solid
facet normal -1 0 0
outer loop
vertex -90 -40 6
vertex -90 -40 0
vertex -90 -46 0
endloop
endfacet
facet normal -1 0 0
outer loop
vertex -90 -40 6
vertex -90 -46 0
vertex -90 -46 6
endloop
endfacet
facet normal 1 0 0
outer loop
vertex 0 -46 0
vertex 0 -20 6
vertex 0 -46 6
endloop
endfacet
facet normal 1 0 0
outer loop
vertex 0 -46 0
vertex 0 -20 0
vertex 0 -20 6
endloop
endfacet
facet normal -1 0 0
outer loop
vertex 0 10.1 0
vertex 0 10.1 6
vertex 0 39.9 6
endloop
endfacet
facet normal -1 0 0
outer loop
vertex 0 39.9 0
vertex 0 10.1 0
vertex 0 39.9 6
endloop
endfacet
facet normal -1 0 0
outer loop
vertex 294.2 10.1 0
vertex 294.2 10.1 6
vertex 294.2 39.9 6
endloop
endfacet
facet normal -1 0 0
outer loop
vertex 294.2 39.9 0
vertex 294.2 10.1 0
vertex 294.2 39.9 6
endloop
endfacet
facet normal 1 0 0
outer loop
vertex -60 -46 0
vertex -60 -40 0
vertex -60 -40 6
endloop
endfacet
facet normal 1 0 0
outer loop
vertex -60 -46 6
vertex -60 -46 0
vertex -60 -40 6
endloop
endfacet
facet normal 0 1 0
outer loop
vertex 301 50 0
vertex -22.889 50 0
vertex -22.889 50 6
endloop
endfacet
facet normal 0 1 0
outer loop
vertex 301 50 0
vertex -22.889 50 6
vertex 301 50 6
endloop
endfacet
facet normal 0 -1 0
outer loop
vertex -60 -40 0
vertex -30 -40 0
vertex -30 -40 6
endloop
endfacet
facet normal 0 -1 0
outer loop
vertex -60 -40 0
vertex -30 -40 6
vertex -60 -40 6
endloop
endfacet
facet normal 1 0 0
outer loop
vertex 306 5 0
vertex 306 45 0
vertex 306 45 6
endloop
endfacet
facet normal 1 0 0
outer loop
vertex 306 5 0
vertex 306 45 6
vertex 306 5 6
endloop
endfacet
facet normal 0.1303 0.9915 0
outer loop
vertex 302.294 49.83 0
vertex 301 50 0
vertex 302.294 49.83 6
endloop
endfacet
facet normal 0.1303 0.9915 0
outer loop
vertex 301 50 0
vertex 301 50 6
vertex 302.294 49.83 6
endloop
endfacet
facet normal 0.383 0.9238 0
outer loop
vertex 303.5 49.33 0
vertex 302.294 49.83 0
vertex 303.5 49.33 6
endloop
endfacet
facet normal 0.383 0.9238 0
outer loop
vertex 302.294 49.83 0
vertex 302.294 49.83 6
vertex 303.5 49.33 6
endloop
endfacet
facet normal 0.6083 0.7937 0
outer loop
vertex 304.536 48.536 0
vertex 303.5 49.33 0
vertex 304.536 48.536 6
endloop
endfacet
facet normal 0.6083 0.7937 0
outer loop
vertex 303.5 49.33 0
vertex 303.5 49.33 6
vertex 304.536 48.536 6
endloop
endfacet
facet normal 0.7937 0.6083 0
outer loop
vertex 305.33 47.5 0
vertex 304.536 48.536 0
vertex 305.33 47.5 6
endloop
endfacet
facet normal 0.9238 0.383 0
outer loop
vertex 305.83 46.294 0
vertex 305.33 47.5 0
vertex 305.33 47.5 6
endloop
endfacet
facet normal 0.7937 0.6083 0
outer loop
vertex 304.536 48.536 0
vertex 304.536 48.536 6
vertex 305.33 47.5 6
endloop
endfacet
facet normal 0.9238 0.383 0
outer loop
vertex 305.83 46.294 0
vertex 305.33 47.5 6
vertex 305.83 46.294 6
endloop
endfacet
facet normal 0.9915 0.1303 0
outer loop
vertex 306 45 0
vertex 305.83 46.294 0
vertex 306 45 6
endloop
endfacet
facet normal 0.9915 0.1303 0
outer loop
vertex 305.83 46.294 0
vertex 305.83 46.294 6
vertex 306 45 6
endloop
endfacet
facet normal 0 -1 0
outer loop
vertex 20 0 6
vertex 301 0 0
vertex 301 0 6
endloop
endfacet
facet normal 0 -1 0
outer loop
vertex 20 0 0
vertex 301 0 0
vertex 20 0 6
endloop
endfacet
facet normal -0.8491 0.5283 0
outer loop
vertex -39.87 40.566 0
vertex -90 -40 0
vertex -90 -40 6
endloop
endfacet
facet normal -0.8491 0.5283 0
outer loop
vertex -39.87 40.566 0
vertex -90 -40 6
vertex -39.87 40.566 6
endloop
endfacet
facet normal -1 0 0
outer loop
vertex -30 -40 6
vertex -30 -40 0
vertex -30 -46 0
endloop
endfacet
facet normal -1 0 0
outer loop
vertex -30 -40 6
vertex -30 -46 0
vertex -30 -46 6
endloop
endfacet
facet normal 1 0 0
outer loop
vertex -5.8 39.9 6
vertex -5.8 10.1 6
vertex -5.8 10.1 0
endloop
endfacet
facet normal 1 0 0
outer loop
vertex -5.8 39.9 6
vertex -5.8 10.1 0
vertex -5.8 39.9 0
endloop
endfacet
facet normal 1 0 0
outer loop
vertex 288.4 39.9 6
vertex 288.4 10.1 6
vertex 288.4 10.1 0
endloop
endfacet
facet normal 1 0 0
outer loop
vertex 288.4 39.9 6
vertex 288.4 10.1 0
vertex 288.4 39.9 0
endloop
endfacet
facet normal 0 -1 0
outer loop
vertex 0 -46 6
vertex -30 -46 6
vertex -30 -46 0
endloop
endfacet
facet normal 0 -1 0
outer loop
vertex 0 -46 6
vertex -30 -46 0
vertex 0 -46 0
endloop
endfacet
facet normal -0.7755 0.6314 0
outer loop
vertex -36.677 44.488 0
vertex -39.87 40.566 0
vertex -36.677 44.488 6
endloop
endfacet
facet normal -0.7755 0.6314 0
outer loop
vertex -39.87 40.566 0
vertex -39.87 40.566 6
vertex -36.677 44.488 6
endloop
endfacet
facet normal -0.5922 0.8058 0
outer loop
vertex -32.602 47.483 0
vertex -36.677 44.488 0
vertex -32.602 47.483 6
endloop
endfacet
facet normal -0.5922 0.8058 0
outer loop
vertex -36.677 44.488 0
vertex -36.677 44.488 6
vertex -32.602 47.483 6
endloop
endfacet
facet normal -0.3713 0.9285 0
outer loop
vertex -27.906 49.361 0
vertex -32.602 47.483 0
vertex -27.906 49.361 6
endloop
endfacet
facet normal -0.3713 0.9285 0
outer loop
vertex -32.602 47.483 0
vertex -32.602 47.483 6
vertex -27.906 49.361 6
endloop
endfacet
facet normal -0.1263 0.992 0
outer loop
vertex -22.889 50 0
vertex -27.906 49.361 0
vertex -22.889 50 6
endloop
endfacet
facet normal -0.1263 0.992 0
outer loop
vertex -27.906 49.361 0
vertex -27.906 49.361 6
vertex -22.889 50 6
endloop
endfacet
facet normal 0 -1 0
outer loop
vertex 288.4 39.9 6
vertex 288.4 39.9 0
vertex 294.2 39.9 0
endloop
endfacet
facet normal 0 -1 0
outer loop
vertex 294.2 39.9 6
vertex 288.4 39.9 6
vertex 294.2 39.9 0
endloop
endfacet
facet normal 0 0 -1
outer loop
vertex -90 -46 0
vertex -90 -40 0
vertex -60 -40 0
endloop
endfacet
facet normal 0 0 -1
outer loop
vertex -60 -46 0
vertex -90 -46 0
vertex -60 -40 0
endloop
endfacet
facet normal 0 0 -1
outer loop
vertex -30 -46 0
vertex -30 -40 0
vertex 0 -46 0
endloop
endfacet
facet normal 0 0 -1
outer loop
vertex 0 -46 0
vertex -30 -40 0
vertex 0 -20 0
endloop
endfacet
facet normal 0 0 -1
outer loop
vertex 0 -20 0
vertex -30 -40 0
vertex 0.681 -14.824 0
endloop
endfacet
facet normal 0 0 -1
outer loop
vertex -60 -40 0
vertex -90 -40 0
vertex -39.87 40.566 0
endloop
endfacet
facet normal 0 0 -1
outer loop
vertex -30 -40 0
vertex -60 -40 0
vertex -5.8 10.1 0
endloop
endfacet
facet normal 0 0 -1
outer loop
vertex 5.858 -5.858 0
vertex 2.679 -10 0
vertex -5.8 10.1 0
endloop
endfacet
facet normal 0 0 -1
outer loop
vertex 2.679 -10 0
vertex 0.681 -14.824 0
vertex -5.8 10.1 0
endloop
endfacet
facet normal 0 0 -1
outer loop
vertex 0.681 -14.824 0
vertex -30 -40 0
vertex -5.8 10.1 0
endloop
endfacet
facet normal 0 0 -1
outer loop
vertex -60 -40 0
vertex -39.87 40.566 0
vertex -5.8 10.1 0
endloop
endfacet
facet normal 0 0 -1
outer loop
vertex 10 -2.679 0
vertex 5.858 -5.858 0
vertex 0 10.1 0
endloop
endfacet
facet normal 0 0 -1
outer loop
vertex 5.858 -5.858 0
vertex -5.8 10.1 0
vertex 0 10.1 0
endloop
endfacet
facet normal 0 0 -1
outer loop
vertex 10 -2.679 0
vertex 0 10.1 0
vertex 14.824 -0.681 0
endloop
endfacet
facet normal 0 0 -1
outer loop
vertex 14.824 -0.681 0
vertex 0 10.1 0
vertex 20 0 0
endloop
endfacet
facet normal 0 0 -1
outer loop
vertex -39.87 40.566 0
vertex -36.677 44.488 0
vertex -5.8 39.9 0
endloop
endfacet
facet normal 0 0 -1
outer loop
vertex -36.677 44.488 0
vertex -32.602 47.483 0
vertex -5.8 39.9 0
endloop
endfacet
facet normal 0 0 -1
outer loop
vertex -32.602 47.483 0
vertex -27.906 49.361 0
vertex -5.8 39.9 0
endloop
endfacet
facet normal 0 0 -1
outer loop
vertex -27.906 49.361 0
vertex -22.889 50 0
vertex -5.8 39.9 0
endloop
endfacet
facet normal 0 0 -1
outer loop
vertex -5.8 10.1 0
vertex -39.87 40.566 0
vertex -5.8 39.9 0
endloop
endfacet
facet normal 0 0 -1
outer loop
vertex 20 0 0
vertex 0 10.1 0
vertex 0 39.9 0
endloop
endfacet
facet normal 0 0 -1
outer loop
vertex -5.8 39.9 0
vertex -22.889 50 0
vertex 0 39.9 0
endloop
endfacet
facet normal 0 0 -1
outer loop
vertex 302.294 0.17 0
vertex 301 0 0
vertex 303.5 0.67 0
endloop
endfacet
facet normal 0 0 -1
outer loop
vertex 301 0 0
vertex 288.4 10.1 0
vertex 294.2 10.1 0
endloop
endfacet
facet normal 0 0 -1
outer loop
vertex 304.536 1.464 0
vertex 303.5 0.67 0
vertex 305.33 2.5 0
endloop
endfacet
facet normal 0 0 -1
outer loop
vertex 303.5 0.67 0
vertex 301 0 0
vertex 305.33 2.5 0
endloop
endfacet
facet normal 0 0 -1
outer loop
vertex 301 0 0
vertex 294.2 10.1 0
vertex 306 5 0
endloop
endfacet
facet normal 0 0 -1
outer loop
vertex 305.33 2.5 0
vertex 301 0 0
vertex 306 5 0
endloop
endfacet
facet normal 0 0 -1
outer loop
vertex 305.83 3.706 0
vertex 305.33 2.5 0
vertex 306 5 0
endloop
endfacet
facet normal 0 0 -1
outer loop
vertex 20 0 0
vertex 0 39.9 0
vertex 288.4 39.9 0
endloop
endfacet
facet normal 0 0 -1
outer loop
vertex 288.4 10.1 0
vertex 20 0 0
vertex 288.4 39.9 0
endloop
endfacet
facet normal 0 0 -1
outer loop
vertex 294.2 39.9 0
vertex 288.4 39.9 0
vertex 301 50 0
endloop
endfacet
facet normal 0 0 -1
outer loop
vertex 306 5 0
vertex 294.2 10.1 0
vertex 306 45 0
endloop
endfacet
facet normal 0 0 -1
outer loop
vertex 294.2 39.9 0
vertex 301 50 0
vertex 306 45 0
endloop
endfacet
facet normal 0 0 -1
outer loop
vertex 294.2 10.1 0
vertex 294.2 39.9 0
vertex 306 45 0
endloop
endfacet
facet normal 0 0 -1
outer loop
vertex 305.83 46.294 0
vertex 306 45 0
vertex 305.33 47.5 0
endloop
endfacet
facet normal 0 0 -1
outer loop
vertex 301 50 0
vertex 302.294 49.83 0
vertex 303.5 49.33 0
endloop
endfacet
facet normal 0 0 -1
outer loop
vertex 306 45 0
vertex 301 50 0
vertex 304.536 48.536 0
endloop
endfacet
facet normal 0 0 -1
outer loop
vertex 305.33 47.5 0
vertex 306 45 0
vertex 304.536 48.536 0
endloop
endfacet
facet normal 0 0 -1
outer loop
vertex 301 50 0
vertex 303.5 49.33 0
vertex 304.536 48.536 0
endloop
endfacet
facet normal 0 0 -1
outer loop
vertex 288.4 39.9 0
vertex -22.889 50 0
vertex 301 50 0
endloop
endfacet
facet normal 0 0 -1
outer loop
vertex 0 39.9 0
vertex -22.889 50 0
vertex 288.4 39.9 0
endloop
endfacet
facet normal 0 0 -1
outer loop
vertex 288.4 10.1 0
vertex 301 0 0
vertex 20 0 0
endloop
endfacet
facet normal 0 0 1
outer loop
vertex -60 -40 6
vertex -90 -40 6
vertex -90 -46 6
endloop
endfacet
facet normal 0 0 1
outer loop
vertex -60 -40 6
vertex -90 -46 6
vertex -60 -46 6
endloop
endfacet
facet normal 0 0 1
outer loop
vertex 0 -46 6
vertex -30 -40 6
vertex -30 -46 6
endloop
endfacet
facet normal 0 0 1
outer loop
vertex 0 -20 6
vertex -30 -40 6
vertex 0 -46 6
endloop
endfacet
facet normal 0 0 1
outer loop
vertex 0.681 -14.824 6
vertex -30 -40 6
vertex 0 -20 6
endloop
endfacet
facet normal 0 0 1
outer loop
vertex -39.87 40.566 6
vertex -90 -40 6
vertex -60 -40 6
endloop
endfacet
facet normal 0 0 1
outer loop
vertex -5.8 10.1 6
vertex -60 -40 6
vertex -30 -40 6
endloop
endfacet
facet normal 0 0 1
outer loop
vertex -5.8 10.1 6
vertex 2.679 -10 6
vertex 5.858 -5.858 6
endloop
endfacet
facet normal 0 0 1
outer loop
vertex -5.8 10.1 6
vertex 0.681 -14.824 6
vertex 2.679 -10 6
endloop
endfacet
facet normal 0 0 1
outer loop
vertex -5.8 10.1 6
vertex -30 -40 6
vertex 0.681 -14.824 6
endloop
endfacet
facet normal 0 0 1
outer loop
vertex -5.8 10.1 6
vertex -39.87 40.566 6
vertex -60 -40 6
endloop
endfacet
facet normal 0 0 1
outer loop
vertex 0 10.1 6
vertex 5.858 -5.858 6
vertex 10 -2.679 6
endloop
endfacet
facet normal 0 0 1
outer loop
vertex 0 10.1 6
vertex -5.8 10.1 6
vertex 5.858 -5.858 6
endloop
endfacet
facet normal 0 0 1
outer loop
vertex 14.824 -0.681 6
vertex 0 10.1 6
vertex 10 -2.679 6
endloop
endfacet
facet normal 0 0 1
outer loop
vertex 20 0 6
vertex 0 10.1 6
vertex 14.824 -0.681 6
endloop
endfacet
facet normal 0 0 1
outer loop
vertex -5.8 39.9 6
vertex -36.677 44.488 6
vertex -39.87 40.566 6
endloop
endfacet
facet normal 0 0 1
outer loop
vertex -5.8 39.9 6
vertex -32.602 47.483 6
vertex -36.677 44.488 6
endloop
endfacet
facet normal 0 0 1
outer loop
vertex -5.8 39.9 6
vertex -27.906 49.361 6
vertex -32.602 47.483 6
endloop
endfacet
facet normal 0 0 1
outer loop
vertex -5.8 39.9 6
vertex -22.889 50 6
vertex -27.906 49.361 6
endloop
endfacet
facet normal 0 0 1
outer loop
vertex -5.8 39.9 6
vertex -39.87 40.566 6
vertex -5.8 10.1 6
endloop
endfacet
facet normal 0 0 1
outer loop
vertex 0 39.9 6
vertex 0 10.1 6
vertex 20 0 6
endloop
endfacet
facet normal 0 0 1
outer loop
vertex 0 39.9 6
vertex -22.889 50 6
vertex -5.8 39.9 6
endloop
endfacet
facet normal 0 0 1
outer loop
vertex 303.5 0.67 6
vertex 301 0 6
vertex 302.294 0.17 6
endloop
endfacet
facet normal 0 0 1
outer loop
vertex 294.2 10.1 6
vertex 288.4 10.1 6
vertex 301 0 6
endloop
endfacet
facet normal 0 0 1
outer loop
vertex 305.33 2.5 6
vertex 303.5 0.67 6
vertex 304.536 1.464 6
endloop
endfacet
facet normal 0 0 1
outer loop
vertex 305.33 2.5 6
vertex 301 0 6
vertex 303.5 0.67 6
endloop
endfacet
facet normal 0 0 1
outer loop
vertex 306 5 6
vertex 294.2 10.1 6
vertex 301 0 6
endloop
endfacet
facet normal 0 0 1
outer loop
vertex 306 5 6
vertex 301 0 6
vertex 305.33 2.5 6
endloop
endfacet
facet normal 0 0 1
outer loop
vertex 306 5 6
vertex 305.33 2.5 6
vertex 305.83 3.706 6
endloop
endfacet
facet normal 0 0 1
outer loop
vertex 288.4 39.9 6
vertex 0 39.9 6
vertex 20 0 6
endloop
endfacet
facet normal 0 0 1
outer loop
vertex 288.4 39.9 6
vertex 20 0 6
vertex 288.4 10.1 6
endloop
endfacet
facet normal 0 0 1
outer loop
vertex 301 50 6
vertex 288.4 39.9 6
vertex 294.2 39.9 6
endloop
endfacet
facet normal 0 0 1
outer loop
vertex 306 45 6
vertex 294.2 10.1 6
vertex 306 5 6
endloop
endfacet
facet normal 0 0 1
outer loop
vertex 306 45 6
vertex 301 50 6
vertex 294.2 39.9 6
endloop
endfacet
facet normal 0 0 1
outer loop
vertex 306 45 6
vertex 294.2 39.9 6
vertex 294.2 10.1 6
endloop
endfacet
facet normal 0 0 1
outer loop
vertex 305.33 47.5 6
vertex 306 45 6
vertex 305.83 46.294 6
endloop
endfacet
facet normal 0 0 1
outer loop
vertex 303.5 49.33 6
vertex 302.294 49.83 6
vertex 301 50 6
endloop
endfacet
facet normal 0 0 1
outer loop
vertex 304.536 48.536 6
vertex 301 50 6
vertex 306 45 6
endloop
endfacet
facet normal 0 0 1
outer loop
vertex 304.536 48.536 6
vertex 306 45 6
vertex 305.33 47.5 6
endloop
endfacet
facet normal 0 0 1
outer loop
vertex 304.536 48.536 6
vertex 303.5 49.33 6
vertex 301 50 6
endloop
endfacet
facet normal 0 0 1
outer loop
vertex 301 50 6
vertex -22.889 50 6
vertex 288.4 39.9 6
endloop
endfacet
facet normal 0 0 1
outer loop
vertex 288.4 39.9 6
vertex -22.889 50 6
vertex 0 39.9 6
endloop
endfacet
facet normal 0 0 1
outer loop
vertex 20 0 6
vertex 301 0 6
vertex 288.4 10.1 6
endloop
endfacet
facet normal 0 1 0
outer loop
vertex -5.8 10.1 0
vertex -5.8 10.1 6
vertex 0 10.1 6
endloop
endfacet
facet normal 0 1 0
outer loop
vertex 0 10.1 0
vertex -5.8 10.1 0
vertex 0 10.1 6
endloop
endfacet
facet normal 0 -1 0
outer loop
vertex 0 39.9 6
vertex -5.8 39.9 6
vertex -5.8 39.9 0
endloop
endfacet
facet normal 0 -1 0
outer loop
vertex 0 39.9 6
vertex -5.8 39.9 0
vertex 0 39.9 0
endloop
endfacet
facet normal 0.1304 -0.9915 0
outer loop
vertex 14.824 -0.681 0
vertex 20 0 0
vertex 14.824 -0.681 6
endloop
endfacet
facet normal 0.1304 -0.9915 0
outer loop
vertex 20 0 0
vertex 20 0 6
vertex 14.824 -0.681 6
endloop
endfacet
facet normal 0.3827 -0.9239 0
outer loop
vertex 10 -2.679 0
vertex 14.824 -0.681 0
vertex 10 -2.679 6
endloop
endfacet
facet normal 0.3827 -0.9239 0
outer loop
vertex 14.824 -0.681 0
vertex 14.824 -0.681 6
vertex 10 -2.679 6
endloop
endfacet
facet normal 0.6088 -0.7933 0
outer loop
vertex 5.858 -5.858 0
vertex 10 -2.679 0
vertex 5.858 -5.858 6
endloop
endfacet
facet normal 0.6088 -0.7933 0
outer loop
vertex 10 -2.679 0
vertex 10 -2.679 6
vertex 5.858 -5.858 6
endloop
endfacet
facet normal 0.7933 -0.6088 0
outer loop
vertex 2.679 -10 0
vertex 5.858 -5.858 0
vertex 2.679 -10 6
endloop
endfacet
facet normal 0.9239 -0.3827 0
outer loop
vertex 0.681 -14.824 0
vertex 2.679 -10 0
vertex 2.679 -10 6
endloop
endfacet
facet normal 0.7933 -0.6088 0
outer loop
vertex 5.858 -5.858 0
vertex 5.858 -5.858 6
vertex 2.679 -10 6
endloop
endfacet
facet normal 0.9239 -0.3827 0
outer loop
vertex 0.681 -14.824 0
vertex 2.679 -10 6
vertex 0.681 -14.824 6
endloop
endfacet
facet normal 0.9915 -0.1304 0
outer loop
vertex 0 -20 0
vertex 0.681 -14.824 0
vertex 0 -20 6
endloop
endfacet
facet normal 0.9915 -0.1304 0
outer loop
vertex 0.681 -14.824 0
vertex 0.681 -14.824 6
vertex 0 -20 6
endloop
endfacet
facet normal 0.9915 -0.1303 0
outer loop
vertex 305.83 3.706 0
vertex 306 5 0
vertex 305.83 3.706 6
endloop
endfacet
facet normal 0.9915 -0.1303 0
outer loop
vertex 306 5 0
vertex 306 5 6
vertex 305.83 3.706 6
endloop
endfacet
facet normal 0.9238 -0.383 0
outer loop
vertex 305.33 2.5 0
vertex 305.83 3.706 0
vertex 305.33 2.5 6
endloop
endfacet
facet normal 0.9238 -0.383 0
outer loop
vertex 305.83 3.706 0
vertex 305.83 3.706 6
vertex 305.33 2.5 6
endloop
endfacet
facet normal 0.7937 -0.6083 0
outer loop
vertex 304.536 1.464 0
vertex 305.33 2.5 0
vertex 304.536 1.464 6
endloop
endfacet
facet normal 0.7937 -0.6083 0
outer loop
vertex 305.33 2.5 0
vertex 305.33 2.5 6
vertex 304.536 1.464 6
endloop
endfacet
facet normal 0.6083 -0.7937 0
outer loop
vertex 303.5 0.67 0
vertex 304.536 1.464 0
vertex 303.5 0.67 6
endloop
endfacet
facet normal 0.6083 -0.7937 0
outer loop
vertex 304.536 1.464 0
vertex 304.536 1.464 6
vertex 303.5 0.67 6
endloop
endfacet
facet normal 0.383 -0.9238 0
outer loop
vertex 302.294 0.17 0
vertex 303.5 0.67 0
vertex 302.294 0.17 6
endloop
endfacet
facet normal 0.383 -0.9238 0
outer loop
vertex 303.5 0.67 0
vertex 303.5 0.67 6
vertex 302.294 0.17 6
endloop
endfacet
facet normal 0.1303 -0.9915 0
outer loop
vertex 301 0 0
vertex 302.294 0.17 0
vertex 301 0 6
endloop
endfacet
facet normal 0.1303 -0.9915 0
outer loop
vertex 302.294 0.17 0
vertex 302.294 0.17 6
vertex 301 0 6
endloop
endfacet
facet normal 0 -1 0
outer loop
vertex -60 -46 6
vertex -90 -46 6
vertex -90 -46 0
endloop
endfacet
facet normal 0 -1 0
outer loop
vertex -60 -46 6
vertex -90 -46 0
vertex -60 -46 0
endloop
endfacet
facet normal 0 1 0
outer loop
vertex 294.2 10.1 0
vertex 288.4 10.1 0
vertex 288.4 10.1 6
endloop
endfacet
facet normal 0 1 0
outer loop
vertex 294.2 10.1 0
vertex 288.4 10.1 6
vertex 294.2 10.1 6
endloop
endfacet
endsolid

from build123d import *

# Parameters (mm, degrees)
SALIENTE_EXTRUIR1_DEPTH = 6
CROQUIS2_W              = 30
CROQUIS2_H              = 6
SALIENTE_EXTRUIR2_DEPTH = 6
CORTAR_EXTRUIR1_REACH   = 8
CROQUIS3_W              = 5.8
CROQUIS3_H              = 29.8
REDONDEO1_R             = 20
REDONDEO2_R             = 5


with BuildPart() as part:
    # Croquis1 → Saliente-Extruir1 (new body)
    with BuildSketch(Plane.XY):
        Polygon((-90, -40), (-34, 50), (306, 50), (306, 0), (0, 0), (0, -40), align=None)
    extrude(amount=SALIENTE_EXTRUIR1_DEPTH)

    # Croquis2 → Saliente-Extruir2 (add)
    with BuildSketch(Plane.XZ.offset(40)):
        with Locations((-75, 3)):
            Rectangle(CROQUIS2_W, CROQUIS2_H)
        with Locations((-15, 3)):
            Rectangle(CROQUIS2_W, CROQUIS2_H)
    extrude(amount=SALIENTE_EXTRUIR2_DEPTH)

    # Croquis3 → Cortar-Extruir1 (cut, up to next)
    with BuildSketch(Plane.XY.offset(6), mode=Mode.PRIVATE) as cortar_extruir1_sk1:
        with Locations((-2.9, 25)):
            Rectangle(CROQUIS3_W, CROQUIS3_H)
    cortar_extruir1_tool1 = extrude(cortar_extruir1_sk1.sketch, amount=-CORTAR_EXTRUIR1_REACH, mode=Mode.PRIVATE) & part.part
    add(cortar_extruir1_tool1.solids().sort_by_distance((-2.9, 25, 6))[0], mode=Mode.SUBTRACT)
    # Croquis3 → Cortar-Extruir1 (cut, up to next)
    with BuildSketch(Plane.XY.offset(6), mode=Mode.PRIVATE) as cortar_extruir1_sk2:
        with Locations((291.3, 25)):
            Rectangle(CROQUIS3_W, CROQUIS3_H)
    cortar_extruir1_tool2 = extrude(cortar_extruir1_sk2.sketch, amount=-CORTAR_EXTRUIR1_REACH, mode=Mode.PRIVATE) & part.part
    add(cortar_extruir1_tool2.solids().sort_by_distance((291.3, 25, 6))[0], mode=Mode.SUBTRACT)

    # Redondeo1
    redondeo1_edges = [part.edges().sort_by_distance(p)[0] for p in [
        (-34, 50, 3),
        (0, 0, 3),
    ]]
    fillet(redondeo1_edges, radius=REDONDEO1_R)

    # Redondeo2
    redondeo2_edges = [part.edges().sort_by_distance(p)[0] for p in [
        (306, 50, 3),
        (306, 0, 3),
    ]]
    fillet(redondeo2_edges, radius=REDONDEO2_R)


solid = part.part
